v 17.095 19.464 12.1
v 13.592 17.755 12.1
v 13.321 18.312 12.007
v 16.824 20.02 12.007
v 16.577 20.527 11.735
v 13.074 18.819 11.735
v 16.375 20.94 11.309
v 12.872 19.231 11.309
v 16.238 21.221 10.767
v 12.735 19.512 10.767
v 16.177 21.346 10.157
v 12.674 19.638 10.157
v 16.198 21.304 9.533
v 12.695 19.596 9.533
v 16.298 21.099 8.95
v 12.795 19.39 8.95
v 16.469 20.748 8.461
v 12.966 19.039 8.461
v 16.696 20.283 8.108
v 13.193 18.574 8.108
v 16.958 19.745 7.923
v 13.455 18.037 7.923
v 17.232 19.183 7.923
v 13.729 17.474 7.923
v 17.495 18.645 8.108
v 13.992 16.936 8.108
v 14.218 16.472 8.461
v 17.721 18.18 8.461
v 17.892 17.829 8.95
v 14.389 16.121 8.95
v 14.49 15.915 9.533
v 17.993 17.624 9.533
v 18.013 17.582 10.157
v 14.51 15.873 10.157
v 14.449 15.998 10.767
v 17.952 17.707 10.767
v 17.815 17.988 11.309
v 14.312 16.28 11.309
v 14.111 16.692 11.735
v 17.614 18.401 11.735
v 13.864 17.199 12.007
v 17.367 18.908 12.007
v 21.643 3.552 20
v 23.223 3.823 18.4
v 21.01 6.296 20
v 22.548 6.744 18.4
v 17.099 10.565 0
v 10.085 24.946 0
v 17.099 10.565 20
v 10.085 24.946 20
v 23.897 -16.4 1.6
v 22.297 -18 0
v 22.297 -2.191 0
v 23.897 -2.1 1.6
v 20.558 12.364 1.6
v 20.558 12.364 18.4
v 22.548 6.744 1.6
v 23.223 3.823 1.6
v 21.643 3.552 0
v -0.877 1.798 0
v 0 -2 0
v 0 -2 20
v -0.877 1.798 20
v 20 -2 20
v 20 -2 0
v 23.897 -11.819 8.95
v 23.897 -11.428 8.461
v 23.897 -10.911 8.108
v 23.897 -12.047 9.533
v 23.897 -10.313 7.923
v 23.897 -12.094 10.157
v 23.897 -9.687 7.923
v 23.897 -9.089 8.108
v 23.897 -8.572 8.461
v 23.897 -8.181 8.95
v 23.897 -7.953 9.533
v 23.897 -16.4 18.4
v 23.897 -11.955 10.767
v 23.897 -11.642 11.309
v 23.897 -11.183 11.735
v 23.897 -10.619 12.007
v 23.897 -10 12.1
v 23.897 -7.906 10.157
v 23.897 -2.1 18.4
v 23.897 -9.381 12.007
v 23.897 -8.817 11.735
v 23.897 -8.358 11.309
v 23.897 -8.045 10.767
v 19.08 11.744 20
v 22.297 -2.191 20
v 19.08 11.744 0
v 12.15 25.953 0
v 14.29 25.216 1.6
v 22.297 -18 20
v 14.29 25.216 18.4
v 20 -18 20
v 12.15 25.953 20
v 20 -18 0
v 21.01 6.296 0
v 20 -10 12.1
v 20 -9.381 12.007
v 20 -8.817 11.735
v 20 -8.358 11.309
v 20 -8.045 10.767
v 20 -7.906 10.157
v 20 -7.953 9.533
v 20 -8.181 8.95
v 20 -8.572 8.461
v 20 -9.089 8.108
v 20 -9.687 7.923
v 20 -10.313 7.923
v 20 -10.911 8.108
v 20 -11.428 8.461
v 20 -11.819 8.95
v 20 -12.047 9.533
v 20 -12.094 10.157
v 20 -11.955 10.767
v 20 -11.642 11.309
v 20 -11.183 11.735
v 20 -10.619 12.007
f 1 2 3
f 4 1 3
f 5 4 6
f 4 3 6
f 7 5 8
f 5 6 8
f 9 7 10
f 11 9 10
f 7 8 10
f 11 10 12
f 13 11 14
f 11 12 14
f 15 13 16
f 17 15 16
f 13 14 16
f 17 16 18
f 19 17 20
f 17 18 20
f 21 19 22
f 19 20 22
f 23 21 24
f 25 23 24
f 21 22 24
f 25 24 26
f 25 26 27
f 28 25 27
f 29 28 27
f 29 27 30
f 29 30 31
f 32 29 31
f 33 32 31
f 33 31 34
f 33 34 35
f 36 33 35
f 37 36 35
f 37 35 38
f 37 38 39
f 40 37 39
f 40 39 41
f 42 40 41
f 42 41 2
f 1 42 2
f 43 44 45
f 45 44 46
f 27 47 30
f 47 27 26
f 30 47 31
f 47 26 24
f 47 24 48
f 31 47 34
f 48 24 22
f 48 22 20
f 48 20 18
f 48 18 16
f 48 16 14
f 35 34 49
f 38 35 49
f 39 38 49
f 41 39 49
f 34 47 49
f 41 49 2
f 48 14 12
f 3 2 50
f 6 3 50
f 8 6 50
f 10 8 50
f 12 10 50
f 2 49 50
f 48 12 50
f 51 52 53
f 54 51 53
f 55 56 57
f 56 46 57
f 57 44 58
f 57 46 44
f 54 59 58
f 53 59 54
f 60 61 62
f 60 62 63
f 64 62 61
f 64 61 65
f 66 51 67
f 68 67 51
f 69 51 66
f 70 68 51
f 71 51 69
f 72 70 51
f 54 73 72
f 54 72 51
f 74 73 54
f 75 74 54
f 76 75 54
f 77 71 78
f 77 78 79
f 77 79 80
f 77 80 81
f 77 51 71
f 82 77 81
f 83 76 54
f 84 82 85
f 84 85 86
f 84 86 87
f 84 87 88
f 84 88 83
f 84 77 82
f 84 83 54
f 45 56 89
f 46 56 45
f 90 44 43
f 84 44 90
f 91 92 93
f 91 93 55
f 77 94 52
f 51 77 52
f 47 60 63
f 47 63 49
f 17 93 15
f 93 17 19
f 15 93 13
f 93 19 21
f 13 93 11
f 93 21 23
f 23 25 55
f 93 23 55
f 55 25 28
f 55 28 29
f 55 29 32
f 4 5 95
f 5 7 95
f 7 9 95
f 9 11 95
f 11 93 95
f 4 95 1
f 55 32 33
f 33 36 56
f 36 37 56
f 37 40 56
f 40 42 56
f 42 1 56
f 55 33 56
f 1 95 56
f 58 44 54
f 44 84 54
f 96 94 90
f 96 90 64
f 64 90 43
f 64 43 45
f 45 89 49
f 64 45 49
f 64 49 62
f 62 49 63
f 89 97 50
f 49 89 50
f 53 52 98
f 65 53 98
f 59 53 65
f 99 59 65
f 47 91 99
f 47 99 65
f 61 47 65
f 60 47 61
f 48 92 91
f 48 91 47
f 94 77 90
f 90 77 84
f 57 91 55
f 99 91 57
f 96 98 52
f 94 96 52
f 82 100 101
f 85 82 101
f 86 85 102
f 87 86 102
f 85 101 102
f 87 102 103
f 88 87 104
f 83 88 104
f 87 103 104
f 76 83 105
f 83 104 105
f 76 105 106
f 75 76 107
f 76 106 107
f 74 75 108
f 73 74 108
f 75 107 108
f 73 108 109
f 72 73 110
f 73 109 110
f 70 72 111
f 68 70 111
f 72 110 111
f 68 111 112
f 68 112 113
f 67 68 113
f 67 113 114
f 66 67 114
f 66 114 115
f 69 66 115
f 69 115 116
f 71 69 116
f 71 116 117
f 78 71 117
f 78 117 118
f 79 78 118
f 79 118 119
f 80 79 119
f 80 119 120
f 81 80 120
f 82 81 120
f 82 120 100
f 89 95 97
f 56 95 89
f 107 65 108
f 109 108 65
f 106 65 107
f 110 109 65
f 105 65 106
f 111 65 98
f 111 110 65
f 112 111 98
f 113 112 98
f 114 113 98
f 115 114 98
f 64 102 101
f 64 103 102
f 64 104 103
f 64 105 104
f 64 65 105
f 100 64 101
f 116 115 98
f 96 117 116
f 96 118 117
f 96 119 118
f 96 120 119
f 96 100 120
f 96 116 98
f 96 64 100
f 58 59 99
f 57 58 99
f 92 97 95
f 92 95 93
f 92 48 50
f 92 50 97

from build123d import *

# Parameters (mm, degrees)
BOSS_EXTRU_1_DEPTH      = 20
ESQUISSE2_W             = 20
ESQUISSE2_H             = 20
BOSS_EXTRU_2_DEPTH      = 2
ESQUISSE3_W             = 20
ESQUISSE3_H             = 20
BOSS_EXTRU_3_DEPTH      = 2
ESQUISSE4_W             = 20
ESQUISSE4_H             = 8.998042174
BOSS_EXTRU_4_DEPTH      = 4
BOSS_EXTRU_5_DEPTH      = 20
CHANFREIN1_SIZE         = 3
CHANFREIN2_SIZE         = 1.6
ESQUISSE7_R             = 2.1
ENL_V_MAT_EXTRU_1_DEPTH = 13.855900094
ESQUISSE8_R             = 2.1
ENL_V_MAT_EXTRU_2_DEPTH = 4.897480259
BOSS_EXTRU_6_DEPTH      = 20


with BuildPart() as part:
    # Esquisse1 → Boss.-Extru.1 (new body)
    with BuildSketch(Plane.XY):
        Polygon((0, 0), (20, 0), (17.975880926, 8.767422936), align=None)
    extrude(amount=BOSS_EXTRU_1_DEPTH)

    # Esquisse2 → Boss.-Extru.2 (add)
    with BuildSketch(Plane(origin=(0, 0, 0), x_dir=(0.898794046, 0.438371147, 0), z_dir=(-0.438371147, 0.898794046, 0))):
        with Locations((10, -10)):
            Rectangle(ESQUISSE2_W, ESQUISSE2_H)
    extrude(amount=BOSS_EXTRU_2_DEPTH)

    # Esquisse3 → Boss.-Extru.3 (add)
    with BuildSketch(Plane.XZ):
        with Locations((10, 10)):
            Rectangle(ESQUISSE3_W, ESQUISSE3_H)
    extrude(amount=BOSS_EXTRU_3_DEPTH)

    # Esquisse4 → Boss.-Extru.4 (add)
    with BuildSketch(Plane(origin=(18.987940463, 4.383711468, 0), x_dir=(0, 0, -1), z_dir=(0.974370065, 0.224951054, 0))):
        with Locations((-10, 0)):
            Rectangle(ESQUISSE4_W, ESQUISSE4_H)
    extrude(amount=BOSS_EXTRU_4_DEPTH)

    # Esquisse5 → Boss.-Extru.5 (add)
    with BuildSketch(Plane.XY.offset(20)):
        Polygon((17.099138632, 10.565011028), (10.085200284, 24.945715769), (13.588232336, 26.65425866), (21.873361185, 9.667227153), (17.975880926, 8.767422936), align=None)
        Polygon((20, 0), (20, -2), (20, -18), (23.897480259, -18), (23.897480259, 0.899804217), align=None)
    extrude(amount=-BOSS_EXTRU_5_DEPTH)

    # Chanfrein1
    chanfrein1_edges = [part.edges().sort_by_distance(p)[0] for p in [
        (23.897480259, 0.899804217, 10),
        (21.873361185, 9.667227153, 10),
    ]]
    chamfer(chanfrein1_edges, length=CHANFREIN1_SIZE)

    # Chanfrein2
    chanfrein2_edges = [part.edges().sort_by_distance(p)[0] for p in [
        (13.588232336, 26.65425866, 10),
        (23.897480259, -10.050097891, 0),
        (23.897480259, -18, 10),
        (23.897480259, -10.050097891, 20),
        (22.885420722, 5.283515685, 20),
        (22.885420722, 5.283515685, 0),
        (17.073240041, 19.508933976, 0),
        (21.553231046, 9.553863125, 0),
        (23.560053678, 0.861359315, 0),
        (17.073240041, 19.508933976, 20),
        (21.553231046, 9.553863125, 20),
        (23.560053678, 0.861359315, 20),
    ]]
    chamfer(chanfrein2_edges, length=CHANFREIN2_SIZE)

    # Esquisse7 → Enlèv. mat.-Extru.1 (cut, through all)
    with BuildSketch(Plane(origin=(17.975880926, 8.767422936, 0), x_dir=(0, 0, 1), z_dir=(-0.898794046, -0.438371147, 0))):
        with Locations((10, 10)):
            Circle(ESQUISSE7_R)
    extrude(amount=-ENL_V_MAT_EXTRU_1_DEPTH, mode=Mode.SUBTRACT)

    # Esquisse8 → Enlèv. mat.-Extru.2 (cut, through all)
    with BuildSketch(Plane.ZY.offset(-20)):
        with Locations((10, -10)):
            Circle(ESQUISSE8_R)
    extrude(amount=-ENL_V_MAT_EXTRU_2_DEPTH, mode=Mode.SUBTRACT)

    # Esquisse9 → Boss.-Extru.6 (add)
    with BuildSketch(Plane.XY.offset(20)):
        Polygon((-0.876742294, 1.797588093), (0, 0), (0, -2), align=None)
    extrude(amount=-BOSS_EXTRU_6_DEPTH)


solid = part.part
